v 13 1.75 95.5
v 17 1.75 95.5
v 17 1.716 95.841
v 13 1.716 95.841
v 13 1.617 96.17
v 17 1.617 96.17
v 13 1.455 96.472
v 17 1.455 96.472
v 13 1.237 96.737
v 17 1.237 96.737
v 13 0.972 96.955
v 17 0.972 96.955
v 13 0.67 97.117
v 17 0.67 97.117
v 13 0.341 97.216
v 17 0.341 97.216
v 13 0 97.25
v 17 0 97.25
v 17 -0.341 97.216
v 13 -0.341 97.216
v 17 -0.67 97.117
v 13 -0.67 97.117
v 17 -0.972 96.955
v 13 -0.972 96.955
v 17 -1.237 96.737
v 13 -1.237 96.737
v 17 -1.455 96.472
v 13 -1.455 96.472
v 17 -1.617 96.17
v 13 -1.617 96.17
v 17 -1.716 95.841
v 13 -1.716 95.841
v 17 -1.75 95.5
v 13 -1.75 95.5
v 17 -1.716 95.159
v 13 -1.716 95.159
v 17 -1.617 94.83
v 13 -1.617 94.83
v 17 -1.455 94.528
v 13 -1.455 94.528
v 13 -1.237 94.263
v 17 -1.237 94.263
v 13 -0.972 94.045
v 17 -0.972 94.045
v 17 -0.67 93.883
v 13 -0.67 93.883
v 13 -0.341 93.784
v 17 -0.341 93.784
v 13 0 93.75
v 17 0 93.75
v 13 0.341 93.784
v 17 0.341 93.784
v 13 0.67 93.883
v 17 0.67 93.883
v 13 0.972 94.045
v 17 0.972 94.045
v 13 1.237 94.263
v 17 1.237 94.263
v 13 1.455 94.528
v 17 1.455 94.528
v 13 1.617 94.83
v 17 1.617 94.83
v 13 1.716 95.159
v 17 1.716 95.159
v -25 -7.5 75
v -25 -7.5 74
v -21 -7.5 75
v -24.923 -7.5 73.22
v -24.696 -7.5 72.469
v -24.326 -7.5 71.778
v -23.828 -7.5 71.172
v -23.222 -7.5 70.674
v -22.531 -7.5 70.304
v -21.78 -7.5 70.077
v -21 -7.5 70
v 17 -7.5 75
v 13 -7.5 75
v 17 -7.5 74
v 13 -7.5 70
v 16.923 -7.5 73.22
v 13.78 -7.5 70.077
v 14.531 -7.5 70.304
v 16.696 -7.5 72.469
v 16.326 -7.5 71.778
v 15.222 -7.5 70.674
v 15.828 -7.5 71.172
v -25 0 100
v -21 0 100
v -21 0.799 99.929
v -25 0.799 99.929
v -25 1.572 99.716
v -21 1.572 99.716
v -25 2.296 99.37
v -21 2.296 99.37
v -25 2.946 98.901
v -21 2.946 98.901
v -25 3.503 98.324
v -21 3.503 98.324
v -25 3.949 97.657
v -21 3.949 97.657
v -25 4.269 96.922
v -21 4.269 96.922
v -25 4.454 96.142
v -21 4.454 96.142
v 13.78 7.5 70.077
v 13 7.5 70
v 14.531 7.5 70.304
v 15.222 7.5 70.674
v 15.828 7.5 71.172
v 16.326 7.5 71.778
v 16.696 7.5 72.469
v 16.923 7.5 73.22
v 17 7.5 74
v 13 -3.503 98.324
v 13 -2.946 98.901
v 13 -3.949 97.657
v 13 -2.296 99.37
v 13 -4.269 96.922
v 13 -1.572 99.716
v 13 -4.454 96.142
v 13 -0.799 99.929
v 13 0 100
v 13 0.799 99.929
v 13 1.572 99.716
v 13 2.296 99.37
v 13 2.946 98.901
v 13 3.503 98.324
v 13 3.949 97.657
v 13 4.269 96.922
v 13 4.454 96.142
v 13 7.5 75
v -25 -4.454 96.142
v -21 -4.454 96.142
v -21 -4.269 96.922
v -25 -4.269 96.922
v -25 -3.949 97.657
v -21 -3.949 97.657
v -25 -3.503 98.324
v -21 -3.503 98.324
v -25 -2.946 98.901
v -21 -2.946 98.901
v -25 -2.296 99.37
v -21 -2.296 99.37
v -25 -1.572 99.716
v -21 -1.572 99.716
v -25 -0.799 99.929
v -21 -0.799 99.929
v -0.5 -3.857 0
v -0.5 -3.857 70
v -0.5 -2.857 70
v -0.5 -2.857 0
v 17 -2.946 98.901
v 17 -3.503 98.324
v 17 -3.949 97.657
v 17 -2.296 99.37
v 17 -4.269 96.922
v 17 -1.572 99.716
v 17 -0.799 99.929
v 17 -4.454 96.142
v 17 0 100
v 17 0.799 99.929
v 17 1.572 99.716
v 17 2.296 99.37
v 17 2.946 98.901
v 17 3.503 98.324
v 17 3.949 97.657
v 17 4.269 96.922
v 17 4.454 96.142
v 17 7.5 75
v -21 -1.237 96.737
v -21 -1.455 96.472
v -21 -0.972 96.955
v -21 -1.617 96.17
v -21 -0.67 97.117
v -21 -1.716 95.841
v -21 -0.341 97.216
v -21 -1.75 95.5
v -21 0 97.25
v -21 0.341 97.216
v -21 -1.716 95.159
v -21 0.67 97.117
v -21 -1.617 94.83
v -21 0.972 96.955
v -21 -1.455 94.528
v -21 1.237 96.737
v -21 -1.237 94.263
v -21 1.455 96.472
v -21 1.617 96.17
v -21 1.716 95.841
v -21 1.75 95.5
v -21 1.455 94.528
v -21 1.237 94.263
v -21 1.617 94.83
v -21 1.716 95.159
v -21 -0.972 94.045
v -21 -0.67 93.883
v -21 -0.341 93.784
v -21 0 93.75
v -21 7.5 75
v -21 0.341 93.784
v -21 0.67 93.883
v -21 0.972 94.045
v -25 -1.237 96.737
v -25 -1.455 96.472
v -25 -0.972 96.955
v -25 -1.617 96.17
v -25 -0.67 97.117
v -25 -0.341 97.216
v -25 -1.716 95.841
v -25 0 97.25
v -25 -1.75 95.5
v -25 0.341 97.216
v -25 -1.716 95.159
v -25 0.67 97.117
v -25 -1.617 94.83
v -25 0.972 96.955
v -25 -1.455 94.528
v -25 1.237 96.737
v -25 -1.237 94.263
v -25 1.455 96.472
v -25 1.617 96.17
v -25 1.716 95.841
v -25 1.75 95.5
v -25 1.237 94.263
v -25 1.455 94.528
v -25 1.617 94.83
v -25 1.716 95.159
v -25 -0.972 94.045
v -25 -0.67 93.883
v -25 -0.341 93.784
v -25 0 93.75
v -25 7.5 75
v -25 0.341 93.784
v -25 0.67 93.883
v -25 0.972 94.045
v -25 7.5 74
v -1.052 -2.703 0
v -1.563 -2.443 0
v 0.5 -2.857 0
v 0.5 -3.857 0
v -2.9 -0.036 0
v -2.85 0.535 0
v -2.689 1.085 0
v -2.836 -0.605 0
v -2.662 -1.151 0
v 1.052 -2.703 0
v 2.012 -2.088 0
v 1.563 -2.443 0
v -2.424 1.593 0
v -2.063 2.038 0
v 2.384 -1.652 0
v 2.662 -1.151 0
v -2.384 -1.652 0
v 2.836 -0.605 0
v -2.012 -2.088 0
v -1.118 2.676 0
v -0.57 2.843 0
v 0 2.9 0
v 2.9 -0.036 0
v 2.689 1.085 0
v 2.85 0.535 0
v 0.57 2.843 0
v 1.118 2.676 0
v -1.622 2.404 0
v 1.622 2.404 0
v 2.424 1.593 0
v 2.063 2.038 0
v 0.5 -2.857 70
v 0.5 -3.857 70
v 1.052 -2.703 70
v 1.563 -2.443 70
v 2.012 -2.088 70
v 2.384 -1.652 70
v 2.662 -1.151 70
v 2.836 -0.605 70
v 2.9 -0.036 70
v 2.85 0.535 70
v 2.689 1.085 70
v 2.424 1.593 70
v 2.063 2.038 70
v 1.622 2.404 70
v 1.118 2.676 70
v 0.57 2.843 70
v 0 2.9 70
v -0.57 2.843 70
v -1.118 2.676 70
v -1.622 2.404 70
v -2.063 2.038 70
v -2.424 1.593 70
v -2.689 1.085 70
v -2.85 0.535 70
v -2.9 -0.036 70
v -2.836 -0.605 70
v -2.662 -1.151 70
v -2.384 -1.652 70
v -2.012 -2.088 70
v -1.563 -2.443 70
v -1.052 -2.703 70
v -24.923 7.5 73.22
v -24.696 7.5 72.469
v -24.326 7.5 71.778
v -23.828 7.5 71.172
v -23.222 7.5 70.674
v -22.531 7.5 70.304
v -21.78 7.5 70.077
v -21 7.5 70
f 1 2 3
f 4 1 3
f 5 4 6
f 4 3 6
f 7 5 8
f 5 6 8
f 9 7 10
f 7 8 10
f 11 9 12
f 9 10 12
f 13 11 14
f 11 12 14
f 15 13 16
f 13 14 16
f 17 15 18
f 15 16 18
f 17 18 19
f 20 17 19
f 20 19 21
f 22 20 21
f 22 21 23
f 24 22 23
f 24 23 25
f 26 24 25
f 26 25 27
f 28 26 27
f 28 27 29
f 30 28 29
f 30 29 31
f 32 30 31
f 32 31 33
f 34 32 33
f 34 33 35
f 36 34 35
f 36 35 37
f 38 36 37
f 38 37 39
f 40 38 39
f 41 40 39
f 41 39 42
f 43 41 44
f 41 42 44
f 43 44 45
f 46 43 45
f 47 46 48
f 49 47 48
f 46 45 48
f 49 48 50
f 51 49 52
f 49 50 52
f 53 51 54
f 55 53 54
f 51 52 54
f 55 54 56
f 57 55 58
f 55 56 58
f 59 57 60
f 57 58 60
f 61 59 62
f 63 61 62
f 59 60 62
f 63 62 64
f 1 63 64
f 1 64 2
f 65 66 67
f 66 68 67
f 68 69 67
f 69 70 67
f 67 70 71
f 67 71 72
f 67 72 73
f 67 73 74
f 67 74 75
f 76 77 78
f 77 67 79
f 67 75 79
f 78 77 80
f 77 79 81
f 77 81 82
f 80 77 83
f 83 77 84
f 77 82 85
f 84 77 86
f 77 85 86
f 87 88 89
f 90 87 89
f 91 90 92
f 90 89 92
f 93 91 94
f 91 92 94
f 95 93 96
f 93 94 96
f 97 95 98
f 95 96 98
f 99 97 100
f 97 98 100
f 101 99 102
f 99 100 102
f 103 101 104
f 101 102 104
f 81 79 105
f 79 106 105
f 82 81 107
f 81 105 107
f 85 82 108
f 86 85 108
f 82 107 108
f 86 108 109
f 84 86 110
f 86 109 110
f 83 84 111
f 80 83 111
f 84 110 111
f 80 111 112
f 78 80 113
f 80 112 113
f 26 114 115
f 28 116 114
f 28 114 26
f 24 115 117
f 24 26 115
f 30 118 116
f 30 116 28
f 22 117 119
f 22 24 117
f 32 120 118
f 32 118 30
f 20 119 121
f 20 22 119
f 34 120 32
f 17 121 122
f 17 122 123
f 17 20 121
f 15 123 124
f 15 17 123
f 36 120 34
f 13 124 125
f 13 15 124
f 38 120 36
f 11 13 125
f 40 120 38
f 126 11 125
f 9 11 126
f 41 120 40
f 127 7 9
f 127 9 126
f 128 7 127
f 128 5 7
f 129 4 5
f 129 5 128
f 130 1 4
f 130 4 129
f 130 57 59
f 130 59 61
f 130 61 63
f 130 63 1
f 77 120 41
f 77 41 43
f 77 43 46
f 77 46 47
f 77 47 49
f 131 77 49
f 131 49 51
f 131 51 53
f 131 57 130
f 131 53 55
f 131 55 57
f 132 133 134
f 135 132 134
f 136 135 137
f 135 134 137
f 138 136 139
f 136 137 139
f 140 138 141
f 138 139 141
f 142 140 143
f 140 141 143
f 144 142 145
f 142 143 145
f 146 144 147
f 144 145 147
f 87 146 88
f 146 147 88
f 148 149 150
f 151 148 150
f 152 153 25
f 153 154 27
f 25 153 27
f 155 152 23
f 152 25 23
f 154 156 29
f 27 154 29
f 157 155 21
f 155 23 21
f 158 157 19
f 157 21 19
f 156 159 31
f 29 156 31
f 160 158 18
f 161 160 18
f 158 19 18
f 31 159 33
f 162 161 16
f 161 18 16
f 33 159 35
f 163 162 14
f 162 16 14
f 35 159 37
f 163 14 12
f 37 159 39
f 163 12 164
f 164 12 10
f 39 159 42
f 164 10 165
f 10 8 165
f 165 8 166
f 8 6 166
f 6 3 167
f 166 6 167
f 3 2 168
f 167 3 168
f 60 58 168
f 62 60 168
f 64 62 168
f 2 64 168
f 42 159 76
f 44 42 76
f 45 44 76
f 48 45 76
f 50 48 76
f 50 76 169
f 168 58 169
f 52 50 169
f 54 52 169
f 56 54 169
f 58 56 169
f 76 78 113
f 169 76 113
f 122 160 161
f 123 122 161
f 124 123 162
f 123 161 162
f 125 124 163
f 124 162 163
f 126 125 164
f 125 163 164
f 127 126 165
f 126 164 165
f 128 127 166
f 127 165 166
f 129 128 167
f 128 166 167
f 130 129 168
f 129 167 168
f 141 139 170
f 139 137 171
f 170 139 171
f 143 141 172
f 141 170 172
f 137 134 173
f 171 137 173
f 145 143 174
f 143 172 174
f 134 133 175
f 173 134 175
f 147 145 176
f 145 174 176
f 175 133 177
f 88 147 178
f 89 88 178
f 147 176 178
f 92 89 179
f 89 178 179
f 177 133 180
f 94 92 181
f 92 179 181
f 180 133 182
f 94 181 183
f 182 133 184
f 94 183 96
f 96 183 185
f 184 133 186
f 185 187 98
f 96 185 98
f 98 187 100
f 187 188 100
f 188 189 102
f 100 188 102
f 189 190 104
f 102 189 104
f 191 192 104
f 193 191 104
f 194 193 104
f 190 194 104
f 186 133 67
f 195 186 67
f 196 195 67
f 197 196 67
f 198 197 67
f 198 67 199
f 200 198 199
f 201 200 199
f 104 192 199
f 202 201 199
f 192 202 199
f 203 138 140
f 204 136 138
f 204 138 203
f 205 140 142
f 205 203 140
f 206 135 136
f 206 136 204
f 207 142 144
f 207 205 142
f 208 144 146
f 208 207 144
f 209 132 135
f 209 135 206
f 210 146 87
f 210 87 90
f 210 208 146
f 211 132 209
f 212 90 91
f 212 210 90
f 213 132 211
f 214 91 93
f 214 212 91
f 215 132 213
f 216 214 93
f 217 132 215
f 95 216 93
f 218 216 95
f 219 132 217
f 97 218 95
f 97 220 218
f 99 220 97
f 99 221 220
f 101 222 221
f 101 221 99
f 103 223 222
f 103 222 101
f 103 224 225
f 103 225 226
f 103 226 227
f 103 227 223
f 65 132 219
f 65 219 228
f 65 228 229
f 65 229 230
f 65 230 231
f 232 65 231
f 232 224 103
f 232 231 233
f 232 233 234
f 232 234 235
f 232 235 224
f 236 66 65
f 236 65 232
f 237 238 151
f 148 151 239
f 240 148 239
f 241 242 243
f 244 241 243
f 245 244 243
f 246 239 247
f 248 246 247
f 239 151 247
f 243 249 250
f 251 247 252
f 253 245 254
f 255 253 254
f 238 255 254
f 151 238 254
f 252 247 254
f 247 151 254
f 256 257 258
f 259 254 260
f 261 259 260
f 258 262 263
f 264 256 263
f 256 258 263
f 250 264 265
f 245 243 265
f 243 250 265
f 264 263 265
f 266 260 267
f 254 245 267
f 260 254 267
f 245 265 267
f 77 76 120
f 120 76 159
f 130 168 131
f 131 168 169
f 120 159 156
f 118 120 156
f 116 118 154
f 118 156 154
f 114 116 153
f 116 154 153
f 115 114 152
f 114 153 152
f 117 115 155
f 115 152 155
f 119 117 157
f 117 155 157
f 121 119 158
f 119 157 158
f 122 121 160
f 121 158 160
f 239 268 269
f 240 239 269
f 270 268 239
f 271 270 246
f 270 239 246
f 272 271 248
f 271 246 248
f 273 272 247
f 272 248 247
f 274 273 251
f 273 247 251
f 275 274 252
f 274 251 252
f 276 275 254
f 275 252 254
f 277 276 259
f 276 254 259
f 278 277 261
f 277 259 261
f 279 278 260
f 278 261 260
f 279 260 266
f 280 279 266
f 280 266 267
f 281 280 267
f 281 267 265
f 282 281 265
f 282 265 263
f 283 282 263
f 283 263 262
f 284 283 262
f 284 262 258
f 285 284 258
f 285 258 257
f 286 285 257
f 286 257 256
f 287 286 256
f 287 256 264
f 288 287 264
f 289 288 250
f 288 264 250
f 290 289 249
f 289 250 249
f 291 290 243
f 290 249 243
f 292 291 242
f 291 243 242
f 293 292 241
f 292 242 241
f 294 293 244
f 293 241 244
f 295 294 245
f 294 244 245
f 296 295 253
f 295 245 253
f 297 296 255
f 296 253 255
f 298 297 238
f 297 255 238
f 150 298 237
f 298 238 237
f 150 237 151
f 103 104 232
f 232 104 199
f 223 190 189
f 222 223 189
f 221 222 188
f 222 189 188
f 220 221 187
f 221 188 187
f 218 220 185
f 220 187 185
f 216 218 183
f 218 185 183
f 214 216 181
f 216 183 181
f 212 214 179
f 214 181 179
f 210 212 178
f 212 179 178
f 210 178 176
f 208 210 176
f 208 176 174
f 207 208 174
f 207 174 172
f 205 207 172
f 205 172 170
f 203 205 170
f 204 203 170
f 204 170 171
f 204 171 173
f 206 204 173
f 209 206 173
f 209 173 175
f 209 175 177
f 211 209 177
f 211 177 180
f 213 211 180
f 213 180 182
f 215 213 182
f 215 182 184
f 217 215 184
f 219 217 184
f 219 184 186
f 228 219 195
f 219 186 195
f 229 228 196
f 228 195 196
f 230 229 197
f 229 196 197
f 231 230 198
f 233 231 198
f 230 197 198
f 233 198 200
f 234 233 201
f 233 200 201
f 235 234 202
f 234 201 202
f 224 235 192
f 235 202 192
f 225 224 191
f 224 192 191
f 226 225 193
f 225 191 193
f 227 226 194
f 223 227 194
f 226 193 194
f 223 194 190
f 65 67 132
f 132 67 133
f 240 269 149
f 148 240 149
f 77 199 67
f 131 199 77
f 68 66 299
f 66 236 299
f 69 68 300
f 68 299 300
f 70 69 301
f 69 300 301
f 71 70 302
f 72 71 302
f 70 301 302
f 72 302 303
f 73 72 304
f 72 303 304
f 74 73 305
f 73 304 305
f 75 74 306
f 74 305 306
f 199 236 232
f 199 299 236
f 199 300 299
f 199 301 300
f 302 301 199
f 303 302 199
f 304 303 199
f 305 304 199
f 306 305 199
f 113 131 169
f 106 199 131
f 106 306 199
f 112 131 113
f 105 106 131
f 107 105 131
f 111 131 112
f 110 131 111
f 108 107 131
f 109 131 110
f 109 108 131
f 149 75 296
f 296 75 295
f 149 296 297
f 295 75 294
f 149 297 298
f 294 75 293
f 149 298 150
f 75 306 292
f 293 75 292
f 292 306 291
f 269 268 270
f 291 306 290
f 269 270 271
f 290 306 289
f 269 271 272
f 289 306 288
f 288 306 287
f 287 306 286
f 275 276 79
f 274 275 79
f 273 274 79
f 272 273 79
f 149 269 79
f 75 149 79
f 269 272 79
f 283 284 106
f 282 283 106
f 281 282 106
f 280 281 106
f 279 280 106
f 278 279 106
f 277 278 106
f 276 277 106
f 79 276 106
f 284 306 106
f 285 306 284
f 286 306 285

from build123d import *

# Parameters (mm, degrees)
F0_R      = 2.9
F1_DEPTH  = 70
F2_W      = 42
F2_H      = 15
F3_DEPTH  = 5
F4_W      = 4
F4_H      = 15
F5_DEPTH  = 25
F6_R      = 1.75
F7_DEPTH  = 50
F8_R      = 4
F10_DEPTH = 70


with BuildPart() as f1:
    # F0 (on Top) → F1 (new body)
    with BuildSketch(Plane.XY):
        Circle(F0_R)
    extrude(amount=F1_DEPTH)

    # F2 (on face) → F3 (join)
    with BuildSketch(Plane.XY.offset(70)):
        with Locations((-4, 0)):
            Rectangle(F2_W, F2_H)
    extrude(amount=F3_DEPTH)

    # F4 (on face) → F5 (join)
    with BuildSketch(Plane.XY.offset(75)):
        with Locations((-23, 0)):
            Rectangle(F4_W, F4_H)
        with Locations((15, 0)):
            Rectangle(F4_W, F4_H)
    extrude(amount=F5_DEPTH)

    # F6 (on face) → F7 (cut)
    with BuildSketch(Plane.YZ.offset(17)):
        with BuildLine():
            Line((-7.5, 75), (-4.45401, 96.141711))
            ThreePointArc((-4.45401, 96.141711), (-2.946379, 98.901301), (0, 100))
            Line((0, 100), (-7.5, 100))
            Line((-7.5, 100), (-7.5, 75))
        make_face()
        with Locations((0, 95.5)):
            Circle(F6_R)
        with BuildLine():
            Line((7.5, 100), (0, 100))
            ThreePointArc((0, 100), (2.946379, 98.901301), (4.45401, 96.141711))
            Line((4.45401, 96.141711), (7.5, 75))
            Line((7.5, 75), (7.5, 100))
        make_face()
    extrude(amount=-F7_DEPTH, mode=Mode.SUBTRACT)

    # F8
    f8_edges = [f1.edges().sort_by_distance(p)[0] for p in [
        (-25, 0, 70),
        (17, 0, 70),
    ]]
    fillet(f8_edges, radius=F8_R)

    # F9 (on face) → F10 (join)
    with BuildSketch(Plane(origin=(0, 0, 70), x_dir=(1, 0, 0), z_dir=(0, 0, -1))):
        with BuildLine():
            ThreePointArc((-0.5, 2.856571), (-1.865476, -2.22036), (2.9, 0))
            ThreePointArc((2.9, 0), (2.22036, 1.865476), (0.5, 2.856571))
            ThreePointArc((0.5, 2.856571), (0, 2.9), (-0.5, 2.856571))
        make_face()
        with BuildLine():
            ThreePointArc((-0.5, 2.856571), (0, 2.9), (0.5, 2.856571))
            Line((0.5, 2.856571), (0.5, 3.856571))
            Line((0.5, 3.856571), (-0.5, 3.856571))
            Line((-0.5, 3.856571), (-0.5, 2.856571))
        make_face()
    extrude(amount=F10_DEPTH)


solid = f1.part
